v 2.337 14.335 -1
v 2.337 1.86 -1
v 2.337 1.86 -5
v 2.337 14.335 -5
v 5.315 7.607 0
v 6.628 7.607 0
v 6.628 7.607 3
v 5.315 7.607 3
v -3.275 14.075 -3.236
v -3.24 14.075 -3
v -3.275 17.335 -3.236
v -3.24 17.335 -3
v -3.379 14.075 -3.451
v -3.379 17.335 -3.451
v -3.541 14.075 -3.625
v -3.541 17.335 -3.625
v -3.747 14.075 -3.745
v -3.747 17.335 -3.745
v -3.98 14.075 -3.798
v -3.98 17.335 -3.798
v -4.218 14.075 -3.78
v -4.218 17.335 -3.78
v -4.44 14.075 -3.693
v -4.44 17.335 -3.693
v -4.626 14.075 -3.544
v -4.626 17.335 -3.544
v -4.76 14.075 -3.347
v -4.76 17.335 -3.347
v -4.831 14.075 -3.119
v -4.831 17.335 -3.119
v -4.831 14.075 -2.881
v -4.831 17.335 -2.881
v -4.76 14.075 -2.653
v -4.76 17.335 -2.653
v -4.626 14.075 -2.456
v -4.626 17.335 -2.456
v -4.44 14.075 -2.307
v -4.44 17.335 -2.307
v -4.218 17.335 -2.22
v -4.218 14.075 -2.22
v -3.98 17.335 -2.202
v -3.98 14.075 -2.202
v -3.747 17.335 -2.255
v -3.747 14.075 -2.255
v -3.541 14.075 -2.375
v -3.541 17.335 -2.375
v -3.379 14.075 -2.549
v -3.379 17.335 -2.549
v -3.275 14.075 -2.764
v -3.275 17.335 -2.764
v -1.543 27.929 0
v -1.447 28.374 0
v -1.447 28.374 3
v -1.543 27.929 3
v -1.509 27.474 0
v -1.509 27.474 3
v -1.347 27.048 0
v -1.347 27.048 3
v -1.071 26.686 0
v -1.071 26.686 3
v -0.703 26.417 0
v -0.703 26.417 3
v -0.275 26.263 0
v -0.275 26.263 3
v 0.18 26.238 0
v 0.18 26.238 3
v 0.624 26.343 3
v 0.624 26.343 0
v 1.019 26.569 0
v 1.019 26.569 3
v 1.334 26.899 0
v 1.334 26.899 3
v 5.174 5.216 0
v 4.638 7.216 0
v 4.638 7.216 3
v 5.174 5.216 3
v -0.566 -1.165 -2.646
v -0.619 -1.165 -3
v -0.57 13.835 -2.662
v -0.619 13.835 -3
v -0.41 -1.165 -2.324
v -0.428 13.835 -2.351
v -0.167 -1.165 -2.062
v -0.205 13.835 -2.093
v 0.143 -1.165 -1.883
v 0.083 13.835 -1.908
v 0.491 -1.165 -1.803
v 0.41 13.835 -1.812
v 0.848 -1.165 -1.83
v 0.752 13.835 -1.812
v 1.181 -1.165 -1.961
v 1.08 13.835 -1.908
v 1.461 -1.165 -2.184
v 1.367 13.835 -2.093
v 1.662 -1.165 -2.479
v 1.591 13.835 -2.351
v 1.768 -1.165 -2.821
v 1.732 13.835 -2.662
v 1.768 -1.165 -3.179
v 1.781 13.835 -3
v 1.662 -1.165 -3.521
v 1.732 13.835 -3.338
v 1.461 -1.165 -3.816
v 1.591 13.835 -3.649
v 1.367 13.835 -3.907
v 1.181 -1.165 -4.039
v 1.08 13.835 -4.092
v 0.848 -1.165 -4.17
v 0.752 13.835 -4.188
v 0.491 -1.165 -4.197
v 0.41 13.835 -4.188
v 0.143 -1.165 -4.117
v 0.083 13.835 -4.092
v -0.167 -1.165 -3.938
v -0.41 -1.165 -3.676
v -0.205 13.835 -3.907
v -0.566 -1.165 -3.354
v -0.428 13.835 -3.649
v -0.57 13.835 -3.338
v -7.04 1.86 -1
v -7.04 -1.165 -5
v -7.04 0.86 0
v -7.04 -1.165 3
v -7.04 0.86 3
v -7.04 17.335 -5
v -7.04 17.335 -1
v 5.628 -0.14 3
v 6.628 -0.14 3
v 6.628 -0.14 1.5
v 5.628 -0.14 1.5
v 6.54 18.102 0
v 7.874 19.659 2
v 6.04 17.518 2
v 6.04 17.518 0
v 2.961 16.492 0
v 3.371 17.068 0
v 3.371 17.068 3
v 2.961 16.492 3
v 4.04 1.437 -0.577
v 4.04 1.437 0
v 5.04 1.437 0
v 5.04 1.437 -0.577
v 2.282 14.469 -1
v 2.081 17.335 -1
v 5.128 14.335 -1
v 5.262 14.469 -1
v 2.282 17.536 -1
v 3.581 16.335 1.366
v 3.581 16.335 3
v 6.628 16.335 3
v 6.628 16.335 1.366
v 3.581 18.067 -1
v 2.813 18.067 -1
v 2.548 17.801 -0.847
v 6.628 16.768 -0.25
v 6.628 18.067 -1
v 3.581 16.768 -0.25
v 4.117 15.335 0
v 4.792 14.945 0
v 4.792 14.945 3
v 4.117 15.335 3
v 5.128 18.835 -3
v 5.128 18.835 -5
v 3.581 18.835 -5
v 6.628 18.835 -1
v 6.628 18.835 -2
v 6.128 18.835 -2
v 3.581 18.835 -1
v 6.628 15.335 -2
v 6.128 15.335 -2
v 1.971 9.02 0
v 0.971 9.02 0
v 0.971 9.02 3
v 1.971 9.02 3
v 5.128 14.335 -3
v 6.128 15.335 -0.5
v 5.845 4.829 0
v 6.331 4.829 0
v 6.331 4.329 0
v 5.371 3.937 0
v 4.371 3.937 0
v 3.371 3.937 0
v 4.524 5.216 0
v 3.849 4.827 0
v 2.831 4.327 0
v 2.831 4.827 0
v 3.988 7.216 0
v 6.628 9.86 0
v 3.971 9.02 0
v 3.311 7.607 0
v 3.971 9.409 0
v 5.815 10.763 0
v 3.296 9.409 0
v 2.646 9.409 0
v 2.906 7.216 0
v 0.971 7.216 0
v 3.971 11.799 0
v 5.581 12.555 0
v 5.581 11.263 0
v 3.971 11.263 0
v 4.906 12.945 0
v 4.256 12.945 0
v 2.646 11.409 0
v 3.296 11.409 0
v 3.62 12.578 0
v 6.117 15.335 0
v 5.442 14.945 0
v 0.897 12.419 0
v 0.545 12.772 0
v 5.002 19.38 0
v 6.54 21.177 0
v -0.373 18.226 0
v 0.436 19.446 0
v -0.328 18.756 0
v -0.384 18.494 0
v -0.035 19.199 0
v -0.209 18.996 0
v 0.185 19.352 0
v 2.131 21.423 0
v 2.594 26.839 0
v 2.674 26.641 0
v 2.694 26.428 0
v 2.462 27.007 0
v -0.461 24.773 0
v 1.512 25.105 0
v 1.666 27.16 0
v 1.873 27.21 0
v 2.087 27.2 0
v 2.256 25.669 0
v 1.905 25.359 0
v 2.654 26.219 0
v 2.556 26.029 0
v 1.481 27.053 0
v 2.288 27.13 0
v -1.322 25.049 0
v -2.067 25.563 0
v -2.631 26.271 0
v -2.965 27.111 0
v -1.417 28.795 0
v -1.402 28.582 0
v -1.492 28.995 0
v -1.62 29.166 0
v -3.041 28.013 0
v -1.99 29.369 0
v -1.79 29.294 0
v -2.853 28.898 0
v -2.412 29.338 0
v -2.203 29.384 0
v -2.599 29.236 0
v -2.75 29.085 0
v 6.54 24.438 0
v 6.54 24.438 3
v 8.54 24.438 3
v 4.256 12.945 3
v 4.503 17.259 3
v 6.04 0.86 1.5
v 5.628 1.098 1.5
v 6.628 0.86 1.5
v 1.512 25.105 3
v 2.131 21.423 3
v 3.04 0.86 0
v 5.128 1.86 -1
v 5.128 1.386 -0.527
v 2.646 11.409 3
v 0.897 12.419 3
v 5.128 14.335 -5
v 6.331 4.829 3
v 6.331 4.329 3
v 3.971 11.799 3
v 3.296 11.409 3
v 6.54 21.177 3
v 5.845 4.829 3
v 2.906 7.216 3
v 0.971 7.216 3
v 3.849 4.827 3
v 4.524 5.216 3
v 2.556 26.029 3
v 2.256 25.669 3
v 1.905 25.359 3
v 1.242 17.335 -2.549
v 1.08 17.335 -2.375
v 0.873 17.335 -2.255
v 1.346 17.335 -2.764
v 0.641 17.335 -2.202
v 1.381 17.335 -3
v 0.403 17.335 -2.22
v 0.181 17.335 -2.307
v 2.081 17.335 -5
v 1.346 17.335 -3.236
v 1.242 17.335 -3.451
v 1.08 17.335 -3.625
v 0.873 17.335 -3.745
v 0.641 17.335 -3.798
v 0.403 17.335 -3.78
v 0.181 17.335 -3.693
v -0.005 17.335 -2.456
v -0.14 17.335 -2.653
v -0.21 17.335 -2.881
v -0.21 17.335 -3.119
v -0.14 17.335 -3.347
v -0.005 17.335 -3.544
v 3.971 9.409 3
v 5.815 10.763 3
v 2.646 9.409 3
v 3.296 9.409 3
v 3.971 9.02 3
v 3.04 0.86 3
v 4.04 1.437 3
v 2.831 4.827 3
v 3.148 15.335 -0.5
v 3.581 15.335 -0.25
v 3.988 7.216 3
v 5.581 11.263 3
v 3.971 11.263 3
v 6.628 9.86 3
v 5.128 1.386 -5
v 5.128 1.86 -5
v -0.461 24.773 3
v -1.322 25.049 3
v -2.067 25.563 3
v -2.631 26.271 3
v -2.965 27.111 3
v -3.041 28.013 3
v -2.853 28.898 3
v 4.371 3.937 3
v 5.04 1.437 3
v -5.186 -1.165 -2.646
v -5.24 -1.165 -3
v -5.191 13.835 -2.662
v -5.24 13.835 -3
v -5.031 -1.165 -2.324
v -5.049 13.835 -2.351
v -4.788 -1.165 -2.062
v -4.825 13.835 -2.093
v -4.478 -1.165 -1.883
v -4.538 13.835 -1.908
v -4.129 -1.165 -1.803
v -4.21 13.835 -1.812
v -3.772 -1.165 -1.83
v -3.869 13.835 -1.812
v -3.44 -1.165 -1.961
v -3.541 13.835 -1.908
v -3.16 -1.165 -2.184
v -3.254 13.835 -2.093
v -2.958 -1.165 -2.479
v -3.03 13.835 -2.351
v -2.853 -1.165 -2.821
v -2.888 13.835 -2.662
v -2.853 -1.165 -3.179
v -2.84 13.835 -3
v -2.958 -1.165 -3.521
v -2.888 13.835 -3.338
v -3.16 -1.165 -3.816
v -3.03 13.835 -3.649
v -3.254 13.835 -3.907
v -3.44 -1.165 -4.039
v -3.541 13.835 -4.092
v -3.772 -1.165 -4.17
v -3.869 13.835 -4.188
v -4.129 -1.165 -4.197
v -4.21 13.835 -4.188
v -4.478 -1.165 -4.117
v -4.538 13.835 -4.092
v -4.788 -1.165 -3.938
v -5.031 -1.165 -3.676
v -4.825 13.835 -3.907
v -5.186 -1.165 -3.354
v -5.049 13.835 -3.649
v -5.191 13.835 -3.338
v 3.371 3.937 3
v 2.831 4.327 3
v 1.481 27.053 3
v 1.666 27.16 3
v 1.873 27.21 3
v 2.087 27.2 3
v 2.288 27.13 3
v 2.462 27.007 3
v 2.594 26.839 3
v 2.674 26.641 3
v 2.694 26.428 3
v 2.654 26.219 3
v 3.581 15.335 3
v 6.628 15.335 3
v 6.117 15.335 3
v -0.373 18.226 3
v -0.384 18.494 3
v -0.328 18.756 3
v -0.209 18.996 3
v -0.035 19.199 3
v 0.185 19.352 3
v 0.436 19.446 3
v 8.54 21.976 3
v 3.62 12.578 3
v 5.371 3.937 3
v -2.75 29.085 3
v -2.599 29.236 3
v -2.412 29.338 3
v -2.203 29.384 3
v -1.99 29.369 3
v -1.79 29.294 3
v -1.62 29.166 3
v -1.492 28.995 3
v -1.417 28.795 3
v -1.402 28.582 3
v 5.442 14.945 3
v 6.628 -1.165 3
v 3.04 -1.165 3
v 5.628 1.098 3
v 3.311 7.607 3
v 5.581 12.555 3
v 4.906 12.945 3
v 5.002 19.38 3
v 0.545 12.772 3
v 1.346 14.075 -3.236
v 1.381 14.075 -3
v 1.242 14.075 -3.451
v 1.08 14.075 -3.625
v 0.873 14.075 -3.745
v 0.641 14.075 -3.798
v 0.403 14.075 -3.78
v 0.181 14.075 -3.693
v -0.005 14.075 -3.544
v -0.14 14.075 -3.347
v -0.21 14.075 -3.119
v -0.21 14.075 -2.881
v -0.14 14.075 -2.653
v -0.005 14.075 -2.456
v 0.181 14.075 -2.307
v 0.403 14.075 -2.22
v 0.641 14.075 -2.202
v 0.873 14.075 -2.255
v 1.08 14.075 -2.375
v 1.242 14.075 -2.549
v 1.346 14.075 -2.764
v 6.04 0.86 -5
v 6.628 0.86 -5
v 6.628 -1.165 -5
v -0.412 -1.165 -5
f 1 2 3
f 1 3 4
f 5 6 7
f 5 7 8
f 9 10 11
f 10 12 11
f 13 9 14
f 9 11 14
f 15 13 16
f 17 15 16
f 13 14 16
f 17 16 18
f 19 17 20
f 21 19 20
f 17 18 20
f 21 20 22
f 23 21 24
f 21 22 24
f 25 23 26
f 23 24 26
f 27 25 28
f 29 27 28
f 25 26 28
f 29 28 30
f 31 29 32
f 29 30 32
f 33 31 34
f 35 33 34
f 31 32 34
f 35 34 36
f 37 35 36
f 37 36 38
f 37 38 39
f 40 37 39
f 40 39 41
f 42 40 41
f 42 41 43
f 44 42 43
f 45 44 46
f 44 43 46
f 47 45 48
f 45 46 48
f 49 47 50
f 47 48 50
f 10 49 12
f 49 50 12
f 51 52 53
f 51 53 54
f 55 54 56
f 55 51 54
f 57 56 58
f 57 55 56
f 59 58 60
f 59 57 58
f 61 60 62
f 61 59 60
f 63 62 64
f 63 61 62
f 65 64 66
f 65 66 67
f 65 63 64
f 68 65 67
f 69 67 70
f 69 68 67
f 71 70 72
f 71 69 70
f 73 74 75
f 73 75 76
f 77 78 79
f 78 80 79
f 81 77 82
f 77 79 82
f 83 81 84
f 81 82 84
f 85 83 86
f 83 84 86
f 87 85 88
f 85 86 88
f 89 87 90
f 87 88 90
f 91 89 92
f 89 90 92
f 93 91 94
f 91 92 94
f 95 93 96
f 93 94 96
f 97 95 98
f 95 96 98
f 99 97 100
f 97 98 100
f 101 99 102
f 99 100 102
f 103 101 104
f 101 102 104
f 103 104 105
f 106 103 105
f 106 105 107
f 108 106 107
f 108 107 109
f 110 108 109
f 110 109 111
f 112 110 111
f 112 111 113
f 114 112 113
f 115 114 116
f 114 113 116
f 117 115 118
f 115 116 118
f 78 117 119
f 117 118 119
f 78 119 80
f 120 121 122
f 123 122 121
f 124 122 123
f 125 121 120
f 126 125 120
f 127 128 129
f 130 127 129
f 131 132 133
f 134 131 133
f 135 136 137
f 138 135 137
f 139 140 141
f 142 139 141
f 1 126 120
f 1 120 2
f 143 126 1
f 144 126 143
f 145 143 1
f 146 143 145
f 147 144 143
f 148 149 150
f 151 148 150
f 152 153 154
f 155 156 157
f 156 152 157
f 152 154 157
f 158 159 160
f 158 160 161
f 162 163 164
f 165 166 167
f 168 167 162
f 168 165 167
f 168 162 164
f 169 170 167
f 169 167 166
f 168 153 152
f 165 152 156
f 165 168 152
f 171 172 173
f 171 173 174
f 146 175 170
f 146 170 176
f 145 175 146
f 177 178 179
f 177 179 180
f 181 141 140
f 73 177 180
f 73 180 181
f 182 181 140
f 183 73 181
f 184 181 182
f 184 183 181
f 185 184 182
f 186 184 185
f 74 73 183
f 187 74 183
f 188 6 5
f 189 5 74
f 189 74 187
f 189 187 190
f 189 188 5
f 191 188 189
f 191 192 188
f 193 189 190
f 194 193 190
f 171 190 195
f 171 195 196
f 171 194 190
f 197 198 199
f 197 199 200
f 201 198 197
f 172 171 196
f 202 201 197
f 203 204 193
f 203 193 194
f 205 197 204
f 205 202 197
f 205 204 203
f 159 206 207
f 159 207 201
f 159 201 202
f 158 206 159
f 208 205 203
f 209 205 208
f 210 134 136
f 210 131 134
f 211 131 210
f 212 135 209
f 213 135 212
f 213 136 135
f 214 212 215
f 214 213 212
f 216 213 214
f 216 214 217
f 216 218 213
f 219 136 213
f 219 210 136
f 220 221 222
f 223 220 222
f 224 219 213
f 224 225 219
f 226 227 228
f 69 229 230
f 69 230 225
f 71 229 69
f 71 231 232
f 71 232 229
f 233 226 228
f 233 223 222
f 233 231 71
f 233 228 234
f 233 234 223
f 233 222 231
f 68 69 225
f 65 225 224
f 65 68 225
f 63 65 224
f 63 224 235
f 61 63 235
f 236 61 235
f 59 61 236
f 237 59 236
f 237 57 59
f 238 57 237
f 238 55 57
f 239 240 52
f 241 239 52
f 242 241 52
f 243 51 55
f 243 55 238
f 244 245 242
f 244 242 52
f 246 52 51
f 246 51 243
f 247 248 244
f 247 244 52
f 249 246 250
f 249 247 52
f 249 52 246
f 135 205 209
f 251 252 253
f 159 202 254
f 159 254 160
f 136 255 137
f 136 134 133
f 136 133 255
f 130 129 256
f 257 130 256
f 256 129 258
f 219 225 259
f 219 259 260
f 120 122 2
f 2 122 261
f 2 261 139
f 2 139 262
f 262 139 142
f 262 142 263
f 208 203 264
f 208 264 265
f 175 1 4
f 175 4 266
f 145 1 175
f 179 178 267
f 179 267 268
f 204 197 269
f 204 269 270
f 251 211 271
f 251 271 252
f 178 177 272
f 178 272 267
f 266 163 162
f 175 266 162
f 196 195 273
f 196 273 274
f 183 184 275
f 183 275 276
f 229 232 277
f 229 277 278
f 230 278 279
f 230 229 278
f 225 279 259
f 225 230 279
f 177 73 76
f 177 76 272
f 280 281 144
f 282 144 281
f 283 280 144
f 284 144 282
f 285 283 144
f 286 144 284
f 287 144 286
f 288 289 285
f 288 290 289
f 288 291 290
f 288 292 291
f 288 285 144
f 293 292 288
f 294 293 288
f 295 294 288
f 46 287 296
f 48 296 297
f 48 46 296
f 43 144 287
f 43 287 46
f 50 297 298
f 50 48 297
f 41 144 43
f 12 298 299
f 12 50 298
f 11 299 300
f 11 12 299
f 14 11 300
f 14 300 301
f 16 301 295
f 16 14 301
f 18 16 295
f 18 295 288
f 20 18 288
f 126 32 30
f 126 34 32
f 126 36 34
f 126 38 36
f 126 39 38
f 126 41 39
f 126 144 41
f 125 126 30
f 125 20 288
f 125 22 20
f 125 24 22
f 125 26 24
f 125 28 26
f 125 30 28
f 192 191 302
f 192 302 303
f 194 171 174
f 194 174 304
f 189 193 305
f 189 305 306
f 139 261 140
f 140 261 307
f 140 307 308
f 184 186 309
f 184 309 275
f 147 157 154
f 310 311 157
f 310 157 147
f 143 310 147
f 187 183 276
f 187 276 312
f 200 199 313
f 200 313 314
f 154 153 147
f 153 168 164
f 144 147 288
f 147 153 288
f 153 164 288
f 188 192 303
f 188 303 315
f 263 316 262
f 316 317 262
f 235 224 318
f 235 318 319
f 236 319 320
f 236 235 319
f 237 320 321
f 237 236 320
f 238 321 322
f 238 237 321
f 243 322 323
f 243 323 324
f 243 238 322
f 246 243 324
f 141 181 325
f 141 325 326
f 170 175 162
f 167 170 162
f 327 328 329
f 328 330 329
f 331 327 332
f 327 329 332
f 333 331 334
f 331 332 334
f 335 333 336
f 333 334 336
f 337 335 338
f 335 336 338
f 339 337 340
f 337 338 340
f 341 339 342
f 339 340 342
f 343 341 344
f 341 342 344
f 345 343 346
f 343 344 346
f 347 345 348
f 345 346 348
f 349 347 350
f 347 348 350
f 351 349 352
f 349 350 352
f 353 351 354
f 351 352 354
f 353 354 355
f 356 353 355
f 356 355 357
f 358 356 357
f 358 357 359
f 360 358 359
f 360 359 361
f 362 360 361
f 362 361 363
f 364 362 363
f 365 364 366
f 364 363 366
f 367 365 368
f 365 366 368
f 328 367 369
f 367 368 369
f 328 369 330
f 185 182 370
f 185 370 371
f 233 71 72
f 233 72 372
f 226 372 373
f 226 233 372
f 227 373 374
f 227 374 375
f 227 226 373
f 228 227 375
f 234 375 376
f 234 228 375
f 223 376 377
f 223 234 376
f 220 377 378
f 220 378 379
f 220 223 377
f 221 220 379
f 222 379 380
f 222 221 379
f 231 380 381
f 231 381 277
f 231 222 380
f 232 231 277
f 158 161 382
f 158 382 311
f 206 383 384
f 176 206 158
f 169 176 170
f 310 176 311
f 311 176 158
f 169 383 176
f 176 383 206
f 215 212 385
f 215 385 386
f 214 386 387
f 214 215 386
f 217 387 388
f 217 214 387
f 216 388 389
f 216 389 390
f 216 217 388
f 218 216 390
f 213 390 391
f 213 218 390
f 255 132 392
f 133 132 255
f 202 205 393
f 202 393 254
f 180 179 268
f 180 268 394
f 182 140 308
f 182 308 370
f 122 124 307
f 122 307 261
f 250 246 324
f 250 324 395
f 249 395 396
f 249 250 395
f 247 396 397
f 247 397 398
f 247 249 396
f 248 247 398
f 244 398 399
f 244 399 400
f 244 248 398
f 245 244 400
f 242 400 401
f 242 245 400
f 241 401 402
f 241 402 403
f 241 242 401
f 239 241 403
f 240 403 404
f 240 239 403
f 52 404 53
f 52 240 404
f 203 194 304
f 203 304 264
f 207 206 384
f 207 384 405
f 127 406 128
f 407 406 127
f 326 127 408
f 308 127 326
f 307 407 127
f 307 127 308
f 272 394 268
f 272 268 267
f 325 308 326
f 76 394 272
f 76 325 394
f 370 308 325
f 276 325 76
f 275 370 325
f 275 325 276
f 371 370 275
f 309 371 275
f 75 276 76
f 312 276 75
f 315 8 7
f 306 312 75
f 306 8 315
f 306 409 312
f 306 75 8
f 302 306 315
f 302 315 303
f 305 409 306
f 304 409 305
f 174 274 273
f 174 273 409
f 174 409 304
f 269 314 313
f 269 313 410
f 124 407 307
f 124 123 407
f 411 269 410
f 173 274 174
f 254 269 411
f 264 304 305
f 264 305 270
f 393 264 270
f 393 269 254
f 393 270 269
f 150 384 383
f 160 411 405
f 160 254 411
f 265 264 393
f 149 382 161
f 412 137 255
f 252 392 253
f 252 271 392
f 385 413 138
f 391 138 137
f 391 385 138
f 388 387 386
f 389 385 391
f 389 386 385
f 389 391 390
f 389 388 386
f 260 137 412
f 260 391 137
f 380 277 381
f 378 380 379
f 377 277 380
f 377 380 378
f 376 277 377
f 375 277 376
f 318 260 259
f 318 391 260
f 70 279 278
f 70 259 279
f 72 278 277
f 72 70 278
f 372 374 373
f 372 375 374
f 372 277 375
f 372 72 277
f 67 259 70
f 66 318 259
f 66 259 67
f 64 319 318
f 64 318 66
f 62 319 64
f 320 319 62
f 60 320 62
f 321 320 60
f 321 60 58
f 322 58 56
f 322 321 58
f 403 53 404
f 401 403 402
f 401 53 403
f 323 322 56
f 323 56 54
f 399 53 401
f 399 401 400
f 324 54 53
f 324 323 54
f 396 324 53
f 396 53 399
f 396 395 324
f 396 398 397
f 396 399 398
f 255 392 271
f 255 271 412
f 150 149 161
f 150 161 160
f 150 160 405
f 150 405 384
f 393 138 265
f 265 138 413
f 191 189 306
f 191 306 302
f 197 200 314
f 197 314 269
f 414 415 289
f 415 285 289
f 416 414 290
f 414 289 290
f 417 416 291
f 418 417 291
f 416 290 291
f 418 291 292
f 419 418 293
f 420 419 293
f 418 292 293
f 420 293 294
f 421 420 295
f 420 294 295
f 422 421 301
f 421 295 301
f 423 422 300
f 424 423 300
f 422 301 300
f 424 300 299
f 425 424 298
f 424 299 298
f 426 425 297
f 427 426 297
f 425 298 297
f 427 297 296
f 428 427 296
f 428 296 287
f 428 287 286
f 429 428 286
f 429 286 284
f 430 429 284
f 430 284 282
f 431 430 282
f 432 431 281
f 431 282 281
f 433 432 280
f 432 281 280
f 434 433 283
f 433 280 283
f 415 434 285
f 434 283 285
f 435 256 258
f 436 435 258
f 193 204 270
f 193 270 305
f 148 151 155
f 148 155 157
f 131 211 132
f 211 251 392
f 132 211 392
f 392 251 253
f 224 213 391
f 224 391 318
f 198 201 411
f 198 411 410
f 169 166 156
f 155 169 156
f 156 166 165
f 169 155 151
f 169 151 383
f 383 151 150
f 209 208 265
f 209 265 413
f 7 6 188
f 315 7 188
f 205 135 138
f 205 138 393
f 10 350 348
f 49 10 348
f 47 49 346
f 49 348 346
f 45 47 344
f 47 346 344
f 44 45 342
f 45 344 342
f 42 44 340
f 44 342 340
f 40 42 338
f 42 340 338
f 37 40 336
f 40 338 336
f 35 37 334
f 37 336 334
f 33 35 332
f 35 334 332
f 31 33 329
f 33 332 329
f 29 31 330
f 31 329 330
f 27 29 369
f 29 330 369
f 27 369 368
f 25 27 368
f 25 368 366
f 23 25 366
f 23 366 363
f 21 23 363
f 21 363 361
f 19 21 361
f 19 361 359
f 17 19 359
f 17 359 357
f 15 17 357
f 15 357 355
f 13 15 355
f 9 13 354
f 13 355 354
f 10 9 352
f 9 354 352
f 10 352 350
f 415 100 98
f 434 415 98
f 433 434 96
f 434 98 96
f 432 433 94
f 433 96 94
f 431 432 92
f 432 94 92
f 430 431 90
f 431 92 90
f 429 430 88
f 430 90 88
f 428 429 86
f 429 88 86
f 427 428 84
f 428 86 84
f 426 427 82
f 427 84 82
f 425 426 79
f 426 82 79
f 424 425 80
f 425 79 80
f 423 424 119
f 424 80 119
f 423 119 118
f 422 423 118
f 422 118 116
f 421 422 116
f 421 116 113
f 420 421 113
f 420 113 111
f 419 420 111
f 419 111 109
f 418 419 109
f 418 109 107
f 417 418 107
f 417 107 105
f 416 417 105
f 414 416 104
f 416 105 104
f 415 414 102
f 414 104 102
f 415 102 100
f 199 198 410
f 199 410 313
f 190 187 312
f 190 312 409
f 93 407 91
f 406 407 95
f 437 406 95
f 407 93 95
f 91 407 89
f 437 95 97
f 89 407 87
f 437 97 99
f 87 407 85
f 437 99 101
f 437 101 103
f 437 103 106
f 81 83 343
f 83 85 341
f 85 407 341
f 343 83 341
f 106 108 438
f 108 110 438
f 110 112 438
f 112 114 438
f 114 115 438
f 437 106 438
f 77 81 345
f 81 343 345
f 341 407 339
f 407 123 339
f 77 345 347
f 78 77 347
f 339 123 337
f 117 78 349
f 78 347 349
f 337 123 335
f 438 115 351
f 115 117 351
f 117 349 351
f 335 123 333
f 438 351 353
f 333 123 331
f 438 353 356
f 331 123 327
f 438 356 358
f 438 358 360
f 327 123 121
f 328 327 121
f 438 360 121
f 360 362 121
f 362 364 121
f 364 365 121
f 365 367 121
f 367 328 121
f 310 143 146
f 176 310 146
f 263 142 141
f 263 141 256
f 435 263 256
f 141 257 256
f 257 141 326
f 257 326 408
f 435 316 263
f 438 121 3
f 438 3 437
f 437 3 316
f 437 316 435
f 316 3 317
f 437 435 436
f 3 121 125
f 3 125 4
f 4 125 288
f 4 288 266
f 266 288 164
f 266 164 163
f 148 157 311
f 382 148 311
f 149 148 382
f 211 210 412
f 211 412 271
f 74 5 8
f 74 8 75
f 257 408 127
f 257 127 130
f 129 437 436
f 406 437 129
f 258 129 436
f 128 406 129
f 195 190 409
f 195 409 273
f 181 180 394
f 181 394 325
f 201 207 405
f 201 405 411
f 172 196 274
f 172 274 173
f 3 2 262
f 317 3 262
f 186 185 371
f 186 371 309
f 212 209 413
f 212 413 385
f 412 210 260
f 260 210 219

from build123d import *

# Parameters (mm, degrees)
BOSS_SWITCH_BODY_DEPTH                         = 3
SKETCH1_W                                      = 4
SKETCH1_H                                      = 3.5
BOSS_FLANGE_WIDTH_DEPTH                        = 5
BOSS_FLANGE_HEIGHT_REACH                       = 38.166
SKETCH2_W                                      = 4
SKETCH2_H                                      = 2
SKETCH2_W_2                                    = 8
SKETCH2_H_2                                    = 2.024975669
CUT_UP_TO_DOWN_DERAILLEUR_CLEARANCE_REACH      = 23.862
SKETCH10_W                                     = 2.453096586
SKETCH10_H                                     = 3
SKETCH17_W                                     = 12.1675
SKETCH17_H                                     = 4
BOSS_FLANGE_SUPPORT_DEPTH                      = 14.475024331
TAP_DRILL_FOR_M2X0_4_TAP1_D                    = 1.6
M2_CLEARANCE_HOLE2_D                           = 2.4
M2_CLEARANCE_HOLE2_DEPTH                       = 15
M2_CLEARANCE_HOLE2_TIP                         = 0.721032743
CUT_UP_TO_DOWN_CANTILEVER_SLOPE_REACH          = 31.347
CUT_DOWN_TO_UP_DERAILLEUR_CLEARANCE_DEPTH      = 33.69867621
CUT_DOWN_TO_UP_DERAILLEUR_CLEARANCE_DEPTH_BACK = 33.69867621
CHAMFER_FLANGE_SUPPORT_SIZE                    = 1.5
CHAMFER_FLANGE_SUPPORT_2_SIZE                  = 1
CHAMFER_FLANGE_SUPPORT_3_SIZE                  = 1
SKETCH18_W                                     = 1.5
SKETCH18_H                                     = 1.577328106
CUT_DOWN_TO_UP_DERAILLEUR_CLEARANCE_2_DEPTH    = 1
SKETCH19_W                                     = 3.046903414
SKETCH19_H                                     = 2.563581512
CUT_UP_TO_DOWN_CANTILEVER_CLEARANCE_DEPTH      = 1
CHAMFER1_SIZE                                  = 1
CHAMFER1_SIZE_2                                = 1.732050808
CHAMFER3_SIZE                                  = 0.75
CHAMFER3_SIZE_2                                = 1.299038106
CHAMFER4_SIZE                                  = 0.5
CHAMFER4_SIZE2                                 = 0.866025404
CHAMFER5_SIZE                                  = 0.5
CHAMFER6_SIZE                                  = 2.5
CHAMFER7_SIZE                                  = 1
CUT_EXTRUDE3_REACH                             = 33.008
CHAMFER8_SIZE                                  = 0.5
CHAMFER8_SIZE2                                 = 1.366025404
SKETCH23_W                                     = 2.791062273
SKETCH23_H                                     = 12.475024331
CUT_EXTRUDE4_DEPTH                             = 31.862053717


# Some blends are built 0.0001 mm under size
with BuildPart() as part:
    # Sketch-SwitchBossUp → Boss-Switch Body (new body)
    with BuildSketch(Plane.XY):
        with BuildLine():
            Line((6.540476927, 21.177422148), (6.540476927, 24.438379064))
            Line((6.540476927, 24.438379064), (8.540476927, 24.438379064))
            Line((8.540476927, 24.438379064), (8.540476927, 20.438379064))
            Line((8.540476927, 20.438379064), (6.040476927, 17.517528279))
            Line((6.040476927, 17.517528279), (2.878366495, 16.985217616))
            Line((2.878366495, 16.985217616), (3.620297651, 12.577888564))
            Line((3.620297651, 12.577888564), (4.256080915, 12.944958203))
            Line((4.256080915, 12.944958203), (4.791964496, 14.944962169))
            Line((4.791964496, 14.944962169), (4.116925685, 15.334689347))
            Line((4.116925685, 15.334689347), (3.581073513, 15.334689347))
            Line((3.581073513, 15.334689347), (3.581073513, 16.334689347))
            Line((3.581073513, 16.334689347), (6.857327822, 16.334689347))
            Line((6.857327822, 16.334689347), (13.441607507, 16.334689347))
            Line((13.441607507, 16.334689347), (13.441607507, -1.165310653))
            Line((13.441607507, -1.165310653), (5.040476927, -1.165310653))
            Line((5.040476927, -1.165310653), (3.040476927, -1.165310653))
            Line((3.040476927, -1.165310653), (3.040476927, 0.859665016))
            Line((3.040476927, 0.859665016), (4.040476927, 1.437015286))
            Line((4.040476927, 1.437015286), (3.370603946, 3.937015286))
            Line((3.370603946, 3.937015286), (2.83114552, 4.326718942))
            Line((2.83114552, 4.326718942), (2.83114552, 4.826718942))
            Line((2.83114552, 4.826718942), (3.58114552, 4.826718942))
            Line((3.58114552, 4.826718942), (3.849107629, 4.826718942))
            Line((3.849107629, 4.826718942), (4.524094713, 5.216429578))
            Line((4.524094713, 5.216429578), (3.988181525, 7.216425611))
            Line((3.988181525, 7.216425611), (3.311378308, 7.607171452))
            Line((3.311378308, 7.607171452), (2.9061262, 7.216422599))
            Line((2.9061262, 7.216422599), (0.971281627, 7.216422599))
            Line((0.971281627, 7.216422599), (0.971281627, 9.019692757))
            Line((0.971281627, 9.019692757), (1.971281627, 9.019692757))
            Line((1.971281627, 9.019692757), (2.646271341, 9.40939825))
            Line((2.646271341, 9.40939825), (2.646271341, 11.40939825))
            Line((2.646271341, 11.40939825), (0.897326855, 12.41915182))
            Line((0.897326855, 12.41915182), (0.545466745, 12.771663724))
            Line((0.545466745, 12.771663724), (-0.372784255, 18.226393961))
            ThreePointArc((-0.372784255, 18.226393961), (-0.209313172, 18.996084896), (0.435897335, 19.446473985))
            Line((0.435897335, 19.446473985), (-0.46073685, 24.772792819))
            ThreePointArc((-0.46073685, 24.772792819), (-2.630501593, 26.270619745), (-2.852546321, 28.897797067))
            ThreePointArc((-2.852546321, 28.897797067), (-1.887813913, 29.338582026), (-1.447028953, 28.373849618))
            ThreePointArc((-1.447028953, 28.373849618), (-0.703448682, 26.416936722), (1.333779254, 26.898727173))
            ThreePointArc((1.333779254, 26.898727173), (2.379722745, 27.074801628), (2.555797201, 26.028858137))
            ThreePointArc((2.555797201, 26.028858137), (2.086504637, 25.507104397), (1.511513111, 25.104801997))
            Line((1.511513111, 25.104801997), (2.546357317, 18.957467576))
            Line((2.546357317, 18.957467576), (4.992893704, 19.36931828))
            Line((4.992893704, 19.36931828), (6.540476927, 21.177422148))
        make_face()
        Polygon((5.581091201, 12.555245643), (5.581100766, 11.263016278), (3.971265023, 11.263016278), (3.97126394, 11.79911022), (3.296271341, 11.409403061), (3.296271341, 9.409403061), (3.971278743, 9.019687356), (3.971278743, 9.409408058), (5.815189335, 10.763016278), (6.627976927, 9.860324206), (6.627976927, 8.365258971), (6.627976927, 7.607171452), (5.314953271, 7.607171452), (4.638181525, 7.216430422), (5.174094713, 5.216434389), (5.845334952, 4.828900281), (6.33114552, 4.828900281), (6.33114552, 4.328900281), (5.370603946, 3.937015286), (4.370603946, 3.937015286), (5.040476927, 1.437015286), (6.040489723, 0.85968718), (9.127976927, 0.85968718), (10.437466736, 2.169176988), (10.437466736, 14.025199539), (9.127976927, 15.334689347), (6.116971898, 15.334689347), (5.441964496, 14.94496698), (4.906080915, 12.944963014), align=None, mode=Mode.SUBTRACT)
    extrude(amount=BOSS_SWITCH_BODY_DEPTH)

    # Sketch1 → Boss-Flange Width (add)
    with BuildSketch(Plane(origin=(0, 0, 0), x_dir=(-1, 0, 0), z_dir=(0, 0, -1))):
        Polygon((-7.581073513, -1.165310653), (0.412170615, -1.165310653), (0.412170615, 0.859665016), (-3.040476927, 0.859665016), (-4.040476927, 1.437015286), (-5.040476927, 1.437015286), (-6.040489723, 0.85968718), (-7.581073513, 0.85968718), align=None)
        with Locations((-5.581073513, 17.084689347)):
            Rectangle(SKETCH1_W, SKETCH1_H)
    extrude(amount=BOSS_FLANGE_WIDTH_DEPTH)

    # Sketch2 → Boss-Flange Height (add, up to next)
    with BuildSketch(Plane(origin=(-7.039523073, 0, 0), x_dir=(0, 0, -1), z_dir=(1, 0, 0)), mode=Mode.PRIVATE) as boss_flange_height_sk1:
        with Locations((3, 16.334689347)):
            Rectangle(SKETCH2_W, SKETCH2_H)
    boss_flange_height_tool1 = extrude(boss_flange_height_sk1.sketch, amount=BOSS_FLANGE_HEIGHT_REACH, mode=Mode.PRIVATE) - part.part
    # Sketch2 → Boss-Flange Height (add, up to next)
    with BuildSketch(Plane(origin=(-7.039523073, 0, 0), x_dir=(0, 0, -1), z_dir=(1, 0, 0)), mode=Mode.PRIVATE) as boss_flange_height_sk2:
        with Locations((1, -0.152822819)):
            Rectangle(SKETCH2_W_2, SKETCH2_H_2)
    boss_flange_height_tool2 = extrude(boss_flange_height_sk2.sketch, amount=BOSS_FLANGE_HEIGHT_REACH, mode=Mode.PRIVATE) - part.part
    add(boss_flange_height_tool1.solids().sort_by_distance((-7.039523, 16.334689, -3))[0])
    add(boss_flange_height_tool2.solids().sort_by_distance((-7.039523, -0.152823, -1))[0])

    # Sketch10 → Cut-Up-To-Down Derailleur Clearance (cut, up to next)
    with BuildSketch(Plane(origin=(0, 15.334689347, 0), x_dir=(1, 0, 0), z_dir=(0, 1, 0)), mode=Mode.PRIVATE) as cut_up_to_down_derailleur_clearance_sk1:
        with Locations((6.35452522, 3.5)):
            Rectangle(SKETCH10_W, SKETCH10_H)
    cut_up_to_down_derailleur_clearance_tool1 = extrude(cut_up_to_down_derailleur_clearance_sk1.sketch, amount=CUT_UP_TO_DOWN_DERAILLEUR_CLEARANCE_REACH, mode=Mode.PRIVATE) & part.part
    add(cut_up_to_down_derailleur_clearance_tool1.solids().sort_by_distance((6.354525, 15.334689, -3.5))[0], mode=Mode.SUBTRACT)

    # Sketch17 → Boss-Flange Support (add)
    with BuildSketch(Plane.XZ.offset(-15.334689347)):
        with Locations((-0.955773073, -3)):
            Rectangle(SKETCH17_W, SKETCH17_H)
    extrude(amount=BOSS_FLANGE_SUPPORT_DEPTH)

    # Tap Drill for M2x0.4 Tap1 (through all)
    with Locations(Plane(origin=(0, -1.165310653, 0), x_dir=(-1, 0, 0), z_dir=(0, -1, 0))):
        with Locations((4.039523073, 3), (-0.581073513, 3)):
            Hole(TAP_DRILL_FOR_M2X0_4_TAP1_D / 2)

    # M2 Clearance Hole2
    with Locations(Plane.XZ.offset(1.165310653)):
        with Locations((-4.039523073, -3), (0.581073513, -3)):
            Hole(M2_CLEARANCE_HOLE2_D / 2, depth=M2_CLEARANCE_HOLE2_DEPTH)
            with Locations((0, 0, -(M2_CLEARANCE_HOLE2_DEPTH + M2_CLEARANCE_HOLE2_TIP / 2))):  # 118° drill point
                Cone(0, M2_CLEARANCE_HOLE2_D / 2, M2_CLEARANCE_HOLE2_TIP, mode=Mode.SUBTRACT)

    # Sketch12 → Cut-Up-to-Down Cantilever Slope (cut, up to next)
    with BuildSketch(Plane(origin=(0, 24.438379064, 0), x_dir=(1, 0, 0), z_dir=(0, 1, 0)), mode=Mode.PRIVATE) as cut_up_to_down_cantilever_slope_sk1:
        Polygon((6.540476927, 0), (8.540476927, -3), (8.540476927, 0), align=None)
    cut_up_to_down_cantilever_slope_tool1 = extrude(cut_up_to_down_cantilever_slope_sk1.sketch, amount=-CUT_UP_TO_DOWN_CANTILEVER_SLOPE_REACH, mode=Mode.PRIVATE) & part.part
    add(cut_up_to_down_cantilever_slope_tool1.solids().sort_by_distance((7.87381, 24.438379, 1))[0], mode=Mode.SUBTRACT)

    # Sketch16 → Cut-Down-to-Up Derailleur Clearance (cut, two sides: drawn at the far end of the back side and taken through both)
    with BuildSketch(Plane(origin=(0, 0, 0), x_dir=(-1, 0, 0), z_dir=(0, 0, -1)).offset(-CUT_DOWN_TO_UP_DERAILLEUR_CLEARANCE_DEPTH_BACK)):
        Polygon((-7.581073513, 18.834689347), (-13.441607507, 18.834689347), (-13.441607507, -1.165310653), (-6.627976927, -1.165310653), (-6.627976927, 5.203794929), (-8.003689255, 5.203794929), (-8.003689255, 12.048417413), (-6.627976927, 12.048417413), (-6.627976927, 17.947659965), align=None)
    extrude(amount=CUT_DOWN_TO_UP_DERAILLEUR_CLEARANCE_DEPTH + CUT_DOWN_TO_UP_DERAILLEUR_CLEARANCE_DEPTH_BACK, mode=Mode.SUBTRACT)

    # Chamfer-Flange Support
    chamfer_flange_support_edges = [part.edges().sort_by_distance(p)[0] for p in [
        (3.581073513, 17.334689347, -3),
    ]]
    chamfer(chamfer_flange_support_edges, length=CHAMFER_FLANGE_SUPPORT_SIZE - 0.0001)  # a hair under: the kernel refuses the full size

    # Chamfer-Flange Support 2
    chamfer_flange_support_2_edges = [part.edges().sort_by_distance(p)[0] for p in [
        (5.127976927, 17.084689347, -2),
        (5.127976927, 15.334689347, -1.5),
    ]]
    chamfer(chamfer_flange_support_2_edges, length=CHAMFER_FLANGE_SUPPORT_2_SIZE)

    # Chamfer-Flange Support 3
    chamfer_flange_support_3_edges = [part.edges().sort_by_distance(p)[0] for p in [
        (-1.999523073, 0.859665016, -1),
    ]]
    chamfer(chamfer_flange_support_3_edges, length=CHAMFER_FLANGE_SUPPORT_3_SIZE)

    # Sketch18 → Cut-Down-to-Up Derailleur Clearance 2 (cut)
    with BuildSketch(Plane(origin=(6.627976927, 0, 0), x_dir=(0, 0, -1), z_dir=(1, 0, 0))):
        with Locations((-2.25, 0.648351233)):
            Rectangle(SKETCH18_W, SKETCH18_H)
    extrude(amount=-CUT_DOWN_TO_UP_DERAILLEUR_CLEARANCE_2_DEPTH, mode=Mode.SUBTRACT)

    # Sketch19 → Cut-Up-to-Down Cantilever Clearance (cut)
    with BuildSketch(Plane.XY):
        with Locations((5.10452522, 17.616480103)):
            Rectangle(SKETCH19_W, SKETCH19_H)
    extrude(amount=-CUT_UP_TO_DOWN_CANTILEVER_CLEARANCE_DEPTH, mode=Mode.SUBTRACT)

    # Chamfer1
    # the kernel refuses this chamfer: 1.732050808, 1 mm, written as the material it adds along each edge
    with BuildSketch(Plane(origin=(6.627976927, 16.334689347, -1), x_dir=(0, -0.05789386240266977, 0.9983227437537926), z_dir=(-1, 0, 0))) as chamfer1_piece_1:
        Polygon((CHAMFER1_SIZE * 0.998322743754, CHAMFER1_SIZE * 0.0578938624027), (-CHAMFER1_SIZE_2 * 0.0578938623883, CHAMFER1_SIZE_2 * 0.998322743505), (0, 0), align=None)
    extrude(amount=3.046903414)

    # Chamfer3
    # the kernel refuses this chamfer: 1.299038106, 0.75 mm, written as the material it adds along each edge
    with BuildSketch(Plane(origin=(3.581073513, 15.334689347, -1), x_dir=(0.05789386240236086, -1.5934376059306423e-13, 0.9983227437538106), z_dir=(0, 1, 0))) as chamfer3_piece_1_section:
        Polygon((CHAMFER3_SIZE * 0.998322743754, -CHAMFER3_SIZE * 0.0578938624027), (-CHAMFER3_SIZE_2 * 0.057893862388, -CHAMFER3_SIZE_2 * 0.998322743505), (0, 0), align=None)
    chamfer3_piece_1 = extrude(amount=6.092773786, mode=Mode.PRIVATE)
    chamfer3_piece_1 = split(chamfer3_piece_1, bisect_by=Plane(origin=(3.127107762, 16.799062109, -0.268105739), z_dir=(0, -0.4999999999999566, -0.8660254037844637)), keep=Keep.TOP, mode=Mode.PRIVATE)
    chamfer3_piece_1 = split(chamfer3_piece_1, bisect_by=Plane(origin=(2.18713947, 17.440655304, -0.784906566), z_dir=(0.7071067811865476, -0.7071067811865476, 0)), keep=Keep.TOP, mode=Mode.PRIVATE)
    add(chamfer3_piece_1)

    # Chamfer4
    chamfer4_edges = [part.edges().sort_by_distance(p)[0] for p in [
        (4.205006167, 15.334689347, -1),
    ]]
    chamfer4_side = [part.faces().sort_by_distance(p)[0] for p in [
        (2.964678171, 15.334689347, -0.682371949),
    ]]
    chamfer(chamfer4_edges, length=CHAMFER4_SIZE, length2=CHAMFER4_SIZE2, reference=chamfer4_side[0])

    # Chamfer5
    chamfer5_edges = [part.edges().sort_by_distance(p)[0] for p in [
        (2.878366495, 16.985217616, 1.5),
    ]]
    chamfer(chamfer5_edges, length=CHAMFER5_SIZE)

    # Chamfer6
    # the kernel refuses this chamfer: 2.5 mm, written as the material it adds along each edge
    with BuildSketch(Plane(origin=(2.546357317, 18.957467576, 0), x_dir=(0.9903165846799726, 0.13882745444541758, 0), z_dir=(0, 0, 1))) as chamfer6_piece_1:
        Polygon((CHAMFER6_SIZE * 0.999621916911, CHAMFER6_SIZE * 0.0274958766106), (-CHAMFER6_SIZE * 0.0274958766106, CHAMFER6_SIZE * 0.999621916911), (0, 0), align=None)
    extrude(amount=3)

    # Chamfer7
    chamfer7_edges = [part.edges().sort_by_distance(p)[0] for p in [
        (7.290476927, 18.977953671, 3),
    ]]
    chamfer(chamfer7_edges, length=CHAMFER7_SIZE)

    # Sketch22 → Cut-Extrude3 (cut, up to next)
    with BuildSketch(Plane.XY, mode=Mode.PRIVATE) as cut_extrude3_sk1:
        Polygon((6.627976927, 17.947659965), (7.581073513, 18.834689347), (6.627976927, 18.834689347), align=None)
    cut_extrude3_tool1 = extrude(cut_extrude3_sk1.sketch, amount=-CUT_EXTRUDE3_REACH, mode=Mode.PRIVATE) & part.part
    add(cut_extrude3_tool1.solids().sort_by_distance((6.945676, 18.539013, 0))[0], mode=Mode.SUBTRACT)

    # Chamfer8
    chamfer8_edges = [part.edges().sort_by_distance(p)[0] for p in [
        (5.10452522, 16.334689347, 0),
    ]]
    chamfer8_side = [part.faces().sort_by_distance(p)[0] for p in [
        (4.861507649, 17.252033573, -0.529628936),
    ]]
    chamfer(chamfer8_edges, length=CHAMFER8_SIZE, length2=CHAMFER8_SIZE2, reference=chamfer8_side[0])

    # Sketch23 → Cut-Extrude4 (cut, through all)
    with BuildSketch(Plane.XY.offset(-1)):
        with Locations((3.732445791, 8.097177182)):
            Rectangle(SKETCH23_W, SKETCH23_H)
    extrude(amount=-CUT_EXTRUDE4_DEPTH, mode=Mode.SUBTRACT)


solid = part.part
